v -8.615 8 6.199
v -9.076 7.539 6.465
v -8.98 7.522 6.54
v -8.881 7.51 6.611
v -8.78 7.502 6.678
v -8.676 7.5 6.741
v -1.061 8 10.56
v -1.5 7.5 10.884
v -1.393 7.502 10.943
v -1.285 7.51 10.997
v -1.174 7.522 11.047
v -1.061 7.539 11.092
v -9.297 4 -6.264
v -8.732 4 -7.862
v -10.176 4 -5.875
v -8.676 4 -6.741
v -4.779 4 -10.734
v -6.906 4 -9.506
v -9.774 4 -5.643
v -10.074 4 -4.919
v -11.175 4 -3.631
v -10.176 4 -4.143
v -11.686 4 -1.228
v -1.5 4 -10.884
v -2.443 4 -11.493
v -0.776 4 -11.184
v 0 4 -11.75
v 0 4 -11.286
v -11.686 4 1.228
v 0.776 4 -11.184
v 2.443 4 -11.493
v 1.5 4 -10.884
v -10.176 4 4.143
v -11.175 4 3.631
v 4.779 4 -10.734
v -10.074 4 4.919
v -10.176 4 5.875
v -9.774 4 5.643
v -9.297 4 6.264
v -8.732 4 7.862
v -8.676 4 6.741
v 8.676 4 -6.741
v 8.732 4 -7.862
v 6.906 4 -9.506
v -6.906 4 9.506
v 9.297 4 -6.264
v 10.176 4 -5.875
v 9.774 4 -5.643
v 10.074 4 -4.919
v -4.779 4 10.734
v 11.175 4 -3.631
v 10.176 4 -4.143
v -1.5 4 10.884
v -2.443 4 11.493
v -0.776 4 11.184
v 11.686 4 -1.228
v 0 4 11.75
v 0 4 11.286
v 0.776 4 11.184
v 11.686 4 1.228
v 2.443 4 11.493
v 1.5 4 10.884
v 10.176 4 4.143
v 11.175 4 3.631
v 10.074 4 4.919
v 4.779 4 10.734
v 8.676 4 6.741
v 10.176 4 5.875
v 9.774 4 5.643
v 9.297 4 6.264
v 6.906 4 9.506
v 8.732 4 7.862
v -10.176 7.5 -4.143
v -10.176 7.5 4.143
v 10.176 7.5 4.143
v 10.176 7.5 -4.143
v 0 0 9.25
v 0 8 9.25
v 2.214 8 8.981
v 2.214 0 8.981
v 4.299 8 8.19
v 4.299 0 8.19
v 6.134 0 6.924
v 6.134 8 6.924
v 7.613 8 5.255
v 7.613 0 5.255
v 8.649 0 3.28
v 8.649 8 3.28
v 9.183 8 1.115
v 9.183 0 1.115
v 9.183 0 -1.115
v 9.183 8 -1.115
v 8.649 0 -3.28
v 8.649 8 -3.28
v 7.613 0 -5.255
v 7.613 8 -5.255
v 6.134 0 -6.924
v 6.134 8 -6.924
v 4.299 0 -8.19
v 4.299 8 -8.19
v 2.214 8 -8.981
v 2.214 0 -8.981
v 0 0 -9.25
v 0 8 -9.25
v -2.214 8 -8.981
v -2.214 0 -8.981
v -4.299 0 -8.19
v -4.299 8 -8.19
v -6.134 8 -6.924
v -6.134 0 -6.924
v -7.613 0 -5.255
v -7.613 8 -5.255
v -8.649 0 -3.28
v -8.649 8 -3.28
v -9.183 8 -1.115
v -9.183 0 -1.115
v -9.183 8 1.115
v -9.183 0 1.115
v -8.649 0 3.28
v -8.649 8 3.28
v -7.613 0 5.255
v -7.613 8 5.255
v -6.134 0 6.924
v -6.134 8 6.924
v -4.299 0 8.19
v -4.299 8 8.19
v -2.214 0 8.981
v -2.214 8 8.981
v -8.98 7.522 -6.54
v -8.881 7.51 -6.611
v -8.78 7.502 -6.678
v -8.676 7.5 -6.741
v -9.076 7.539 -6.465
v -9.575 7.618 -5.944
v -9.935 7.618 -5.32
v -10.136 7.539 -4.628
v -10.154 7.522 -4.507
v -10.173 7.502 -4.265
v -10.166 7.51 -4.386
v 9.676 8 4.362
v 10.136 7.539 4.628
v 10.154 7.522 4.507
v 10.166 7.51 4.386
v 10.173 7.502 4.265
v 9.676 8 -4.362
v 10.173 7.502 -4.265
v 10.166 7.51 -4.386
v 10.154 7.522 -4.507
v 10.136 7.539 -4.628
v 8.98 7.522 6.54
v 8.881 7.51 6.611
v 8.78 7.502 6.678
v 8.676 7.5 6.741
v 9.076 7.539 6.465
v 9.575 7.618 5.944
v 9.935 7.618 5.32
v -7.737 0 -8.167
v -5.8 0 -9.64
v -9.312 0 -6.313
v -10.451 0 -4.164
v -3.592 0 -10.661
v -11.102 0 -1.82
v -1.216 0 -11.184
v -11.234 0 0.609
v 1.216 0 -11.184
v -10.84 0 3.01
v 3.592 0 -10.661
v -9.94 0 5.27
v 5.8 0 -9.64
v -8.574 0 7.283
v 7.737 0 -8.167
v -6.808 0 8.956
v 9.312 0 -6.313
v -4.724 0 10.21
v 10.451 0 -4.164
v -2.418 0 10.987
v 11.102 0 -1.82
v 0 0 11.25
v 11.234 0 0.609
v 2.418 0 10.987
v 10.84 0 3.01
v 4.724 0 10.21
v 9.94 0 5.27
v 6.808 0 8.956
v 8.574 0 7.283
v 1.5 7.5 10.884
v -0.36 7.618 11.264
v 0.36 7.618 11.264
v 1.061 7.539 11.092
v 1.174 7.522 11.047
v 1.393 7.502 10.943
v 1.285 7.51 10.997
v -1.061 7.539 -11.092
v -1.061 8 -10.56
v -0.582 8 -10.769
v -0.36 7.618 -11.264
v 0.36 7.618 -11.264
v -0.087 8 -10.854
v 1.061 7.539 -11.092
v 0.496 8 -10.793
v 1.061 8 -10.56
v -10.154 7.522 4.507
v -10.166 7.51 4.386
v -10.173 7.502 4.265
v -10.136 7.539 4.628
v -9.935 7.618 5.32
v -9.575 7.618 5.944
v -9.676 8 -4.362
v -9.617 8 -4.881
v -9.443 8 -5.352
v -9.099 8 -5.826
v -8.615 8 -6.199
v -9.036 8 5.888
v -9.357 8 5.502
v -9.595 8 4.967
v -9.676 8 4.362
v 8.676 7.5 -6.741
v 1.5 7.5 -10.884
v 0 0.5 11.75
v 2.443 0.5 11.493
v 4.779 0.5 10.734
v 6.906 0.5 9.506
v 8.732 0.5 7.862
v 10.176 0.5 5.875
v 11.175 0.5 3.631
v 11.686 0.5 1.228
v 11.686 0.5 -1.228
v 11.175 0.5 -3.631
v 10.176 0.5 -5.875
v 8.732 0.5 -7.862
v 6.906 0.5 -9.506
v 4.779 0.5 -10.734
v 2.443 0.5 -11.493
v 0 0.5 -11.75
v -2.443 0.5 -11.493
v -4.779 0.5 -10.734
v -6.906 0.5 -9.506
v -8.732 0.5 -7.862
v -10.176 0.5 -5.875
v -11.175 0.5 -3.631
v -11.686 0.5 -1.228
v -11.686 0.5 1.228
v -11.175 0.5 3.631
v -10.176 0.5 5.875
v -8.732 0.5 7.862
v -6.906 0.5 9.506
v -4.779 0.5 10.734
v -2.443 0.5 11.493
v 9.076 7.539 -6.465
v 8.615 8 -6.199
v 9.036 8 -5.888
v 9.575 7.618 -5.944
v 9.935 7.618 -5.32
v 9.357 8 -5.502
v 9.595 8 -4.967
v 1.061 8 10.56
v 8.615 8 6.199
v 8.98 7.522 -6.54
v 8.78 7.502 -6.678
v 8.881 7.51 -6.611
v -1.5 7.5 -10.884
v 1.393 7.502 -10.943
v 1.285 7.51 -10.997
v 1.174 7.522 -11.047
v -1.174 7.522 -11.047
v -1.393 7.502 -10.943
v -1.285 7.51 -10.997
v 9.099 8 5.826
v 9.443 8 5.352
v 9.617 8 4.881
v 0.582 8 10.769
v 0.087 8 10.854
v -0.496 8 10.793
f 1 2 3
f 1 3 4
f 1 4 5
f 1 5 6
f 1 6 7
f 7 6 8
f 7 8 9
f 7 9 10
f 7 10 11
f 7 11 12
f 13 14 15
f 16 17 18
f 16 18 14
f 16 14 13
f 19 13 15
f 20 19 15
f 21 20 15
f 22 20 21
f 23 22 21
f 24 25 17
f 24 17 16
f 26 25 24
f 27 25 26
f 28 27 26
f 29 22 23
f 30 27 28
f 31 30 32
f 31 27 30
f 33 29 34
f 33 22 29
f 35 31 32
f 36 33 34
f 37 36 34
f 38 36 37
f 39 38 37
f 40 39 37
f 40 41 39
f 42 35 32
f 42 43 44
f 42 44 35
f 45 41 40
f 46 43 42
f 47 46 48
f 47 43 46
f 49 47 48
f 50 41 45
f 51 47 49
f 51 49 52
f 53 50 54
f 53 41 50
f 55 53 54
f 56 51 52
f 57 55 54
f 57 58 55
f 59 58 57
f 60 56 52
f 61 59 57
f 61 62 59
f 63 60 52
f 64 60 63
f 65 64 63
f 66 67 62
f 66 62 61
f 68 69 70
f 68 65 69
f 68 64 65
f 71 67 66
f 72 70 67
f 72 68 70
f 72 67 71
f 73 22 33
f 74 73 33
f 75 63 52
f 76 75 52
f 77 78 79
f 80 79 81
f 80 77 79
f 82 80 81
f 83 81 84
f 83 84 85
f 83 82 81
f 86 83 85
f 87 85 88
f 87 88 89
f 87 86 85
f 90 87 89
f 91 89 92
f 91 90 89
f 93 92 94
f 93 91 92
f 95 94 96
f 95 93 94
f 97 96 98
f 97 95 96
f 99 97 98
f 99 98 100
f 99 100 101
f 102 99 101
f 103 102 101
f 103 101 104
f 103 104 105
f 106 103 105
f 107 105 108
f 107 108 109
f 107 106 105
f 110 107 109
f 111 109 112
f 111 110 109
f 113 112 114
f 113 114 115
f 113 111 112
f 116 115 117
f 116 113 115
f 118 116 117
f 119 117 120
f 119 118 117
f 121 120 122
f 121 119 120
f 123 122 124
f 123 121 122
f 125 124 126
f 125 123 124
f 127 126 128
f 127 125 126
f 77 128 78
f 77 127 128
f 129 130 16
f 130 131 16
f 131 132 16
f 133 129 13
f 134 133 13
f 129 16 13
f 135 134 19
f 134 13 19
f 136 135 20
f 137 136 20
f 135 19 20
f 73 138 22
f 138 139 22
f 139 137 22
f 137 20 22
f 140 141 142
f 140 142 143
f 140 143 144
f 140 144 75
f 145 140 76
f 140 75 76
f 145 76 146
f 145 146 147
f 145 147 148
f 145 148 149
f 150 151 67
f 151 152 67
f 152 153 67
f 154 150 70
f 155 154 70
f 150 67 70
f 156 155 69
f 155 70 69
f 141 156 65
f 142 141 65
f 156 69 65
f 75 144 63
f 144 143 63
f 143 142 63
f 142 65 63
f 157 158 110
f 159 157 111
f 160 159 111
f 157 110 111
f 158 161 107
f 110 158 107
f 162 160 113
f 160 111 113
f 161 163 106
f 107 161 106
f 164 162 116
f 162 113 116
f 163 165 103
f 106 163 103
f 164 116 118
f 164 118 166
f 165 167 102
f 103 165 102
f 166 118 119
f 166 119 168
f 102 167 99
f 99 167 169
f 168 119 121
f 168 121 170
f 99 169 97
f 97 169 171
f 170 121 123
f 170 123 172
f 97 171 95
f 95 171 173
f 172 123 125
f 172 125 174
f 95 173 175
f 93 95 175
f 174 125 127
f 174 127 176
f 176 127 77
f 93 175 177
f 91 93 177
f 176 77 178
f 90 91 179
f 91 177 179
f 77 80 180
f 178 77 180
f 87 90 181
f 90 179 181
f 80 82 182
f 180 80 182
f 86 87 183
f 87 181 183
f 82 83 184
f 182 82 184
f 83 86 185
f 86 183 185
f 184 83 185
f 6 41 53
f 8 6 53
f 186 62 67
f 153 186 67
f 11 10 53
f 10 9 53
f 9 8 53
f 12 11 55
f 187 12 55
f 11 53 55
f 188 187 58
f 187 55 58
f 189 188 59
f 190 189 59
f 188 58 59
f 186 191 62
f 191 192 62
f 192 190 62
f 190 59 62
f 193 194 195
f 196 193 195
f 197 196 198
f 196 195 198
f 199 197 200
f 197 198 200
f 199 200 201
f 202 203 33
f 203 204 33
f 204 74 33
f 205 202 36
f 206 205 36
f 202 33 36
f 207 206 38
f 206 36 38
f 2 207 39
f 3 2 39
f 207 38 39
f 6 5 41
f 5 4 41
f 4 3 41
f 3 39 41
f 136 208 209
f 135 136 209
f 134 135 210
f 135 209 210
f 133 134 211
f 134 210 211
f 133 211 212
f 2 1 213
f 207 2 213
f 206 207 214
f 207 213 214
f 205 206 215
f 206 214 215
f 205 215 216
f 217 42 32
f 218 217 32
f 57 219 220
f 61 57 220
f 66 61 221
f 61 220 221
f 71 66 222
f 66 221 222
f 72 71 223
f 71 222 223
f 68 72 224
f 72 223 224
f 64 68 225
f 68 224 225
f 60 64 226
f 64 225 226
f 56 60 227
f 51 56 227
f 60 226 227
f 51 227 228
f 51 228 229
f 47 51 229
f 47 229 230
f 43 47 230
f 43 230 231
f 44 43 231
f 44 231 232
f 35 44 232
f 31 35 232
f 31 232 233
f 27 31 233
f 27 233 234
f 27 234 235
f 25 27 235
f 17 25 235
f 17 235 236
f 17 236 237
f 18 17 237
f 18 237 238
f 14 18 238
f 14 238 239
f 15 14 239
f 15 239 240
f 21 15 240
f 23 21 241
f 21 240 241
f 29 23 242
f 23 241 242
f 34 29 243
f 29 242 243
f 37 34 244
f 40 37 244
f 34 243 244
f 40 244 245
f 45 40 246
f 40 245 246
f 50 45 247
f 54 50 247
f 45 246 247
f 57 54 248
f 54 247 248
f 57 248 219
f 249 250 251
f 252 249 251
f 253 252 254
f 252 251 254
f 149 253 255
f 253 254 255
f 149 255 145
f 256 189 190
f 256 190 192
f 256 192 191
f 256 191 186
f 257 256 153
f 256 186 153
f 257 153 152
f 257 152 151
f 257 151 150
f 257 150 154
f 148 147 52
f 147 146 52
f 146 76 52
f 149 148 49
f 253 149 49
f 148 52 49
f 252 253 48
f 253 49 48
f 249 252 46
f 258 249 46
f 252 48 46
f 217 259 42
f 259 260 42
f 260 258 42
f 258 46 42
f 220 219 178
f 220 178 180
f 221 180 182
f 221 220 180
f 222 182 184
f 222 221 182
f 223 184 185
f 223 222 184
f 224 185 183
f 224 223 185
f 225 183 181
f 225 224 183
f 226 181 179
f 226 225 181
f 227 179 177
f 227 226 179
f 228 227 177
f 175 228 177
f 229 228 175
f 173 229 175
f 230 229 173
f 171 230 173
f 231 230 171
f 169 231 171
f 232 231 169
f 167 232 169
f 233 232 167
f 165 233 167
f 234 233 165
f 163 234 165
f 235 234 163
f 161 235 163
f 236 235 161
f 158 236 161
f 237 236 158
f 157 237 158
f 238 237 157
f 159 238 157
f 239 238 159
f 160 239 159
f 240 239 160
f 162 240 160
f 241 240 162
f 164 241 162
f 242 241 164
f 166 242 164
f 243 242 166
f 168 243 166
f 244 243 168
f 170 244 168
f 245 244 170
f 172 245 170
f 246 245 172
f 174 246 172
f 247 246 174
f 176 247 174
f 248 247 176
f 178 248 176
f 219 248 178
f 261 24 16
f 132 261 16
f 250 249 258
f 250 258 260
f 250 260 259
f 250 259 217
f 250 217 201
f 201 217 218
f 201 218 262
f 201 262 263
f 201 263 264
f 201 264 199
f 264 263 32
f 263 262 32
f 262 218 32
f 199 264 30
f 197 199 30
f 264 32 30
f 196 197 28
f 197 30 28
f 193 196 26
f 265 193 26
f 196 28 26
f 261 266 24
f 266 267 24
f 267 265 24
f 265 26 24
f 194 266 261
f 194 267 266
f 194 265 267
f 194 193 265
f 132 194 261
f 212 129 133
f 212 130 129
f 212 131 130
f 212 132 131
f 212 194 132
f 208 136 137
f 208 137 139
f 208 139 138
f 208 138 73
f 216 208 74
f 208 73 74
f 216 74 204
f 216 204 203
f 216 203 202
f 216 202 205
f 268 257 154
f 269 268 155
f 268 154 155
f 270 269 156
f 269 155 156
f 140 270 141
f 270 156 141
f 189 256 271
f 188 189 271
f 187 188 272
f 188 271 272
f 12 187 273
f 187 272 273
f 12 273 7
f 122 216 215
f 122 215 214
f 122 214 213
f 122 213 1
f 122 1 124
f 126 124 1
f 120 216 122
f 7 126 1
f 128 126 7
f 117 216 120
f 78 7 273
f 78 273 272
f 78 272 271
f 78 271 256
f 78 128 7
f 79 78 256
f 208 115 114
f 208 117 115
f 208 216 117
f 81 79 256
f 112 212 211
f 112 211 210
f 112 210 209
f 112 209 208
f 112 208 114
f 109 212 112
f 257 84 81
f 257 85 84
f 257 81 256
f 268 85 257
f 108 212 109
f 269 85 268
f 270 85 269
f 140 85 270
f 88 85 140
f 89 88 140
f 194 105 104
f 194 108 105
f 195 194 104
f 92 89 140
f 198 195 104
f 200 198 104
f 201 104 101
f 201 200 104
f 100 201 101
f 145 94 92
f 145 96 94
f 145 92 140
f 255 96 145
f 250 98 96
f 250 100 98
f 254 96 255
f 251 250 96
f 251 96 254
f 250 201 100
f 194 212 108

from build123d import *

# Parameters (mm, degrees)
SKETCH_1_R      = 11.75
SKETCH_1_R_2    = 9.25
EXTRUDE_1_DEPTH = 4
SKETCH_2_R      = 9.25
EXTRUDE_2_DEPTH = 4
CHAMFER_1_SIZE  = 0.5
FILLET_1_R      = 3


with BuildPart() as part:
    # 草图1 → 凸台-拉伸1 (new body)
    with BuildSketch(Plane(origin=(0, 0, 0), x_dir=(1, 0, 0), z_dir=(0, 1, 0))):
        with Locations(Location((0, 0, 0), (0, 0, 270))):
            Circle(SKETCH_1_R)
        with Locations(Location((0, 0, 0), (0, 0, 270))):
            Circle(SKETCH_1_R_2, mode=Mode.SUBTRACT)
    extrude(amount=EXTRUDE_1_DEPTH)

    # 草图2 → 凸台-拉伸2 (add)
    with BuildSketch(Plane(origin=(0, 4, 0), x_dir=(1, 0, 0), z_dir=(0, 1, 0))):
        Polygon((0, 11.75), (-10.175798494, 5.875), (-10.175798494, -5.875), (0, -11.75), (10.175798494, -5.875), (10.175798494, 5.875), align=None)
        with Locations(Location((0, 0, 0), (0, 0, 270))):
            Circle(SKETCH_2_R, mode=Mode.SUBTRACT)
    extrude(amount=EXTRUDE_2_DEPTH)

    # 倒角1
    chamfer_1_edges = [part.edges().sort_by_distance(p)[0] for p in [
        (5.087899247, 8, -8.8125),
        (-5.087899247, 8, -8.8125),
        (-10.175798494, 8, 0),
        (-5.087899247, 8, 8.8125),
        (5.087899247, 8, 8.8125),
        (10.175798494, 8, 0),
        (0, 0, -11.75),
    ]]
    chamfer(chamfer_1_edges, length=CHAMFER_1_SIZE)

    # 圆角1
    # the kernel refuses this fillet: 3 mm, written as the material it takes off along each edge
    with BuildSketch(Plane(origin=(-10.175798494, 4, 5.875), x_dir=(0.8660254037844421, 0, 0.49999999999999395), z_dir=(0, 1, 0)), Plane(origin=(-10.175798494, 4, -5.875), x_dir=(0, 0, 1), z_dir=(0, 1, 0)), Plane(origin=(0, 4, -11.75), x_dir=(-0.866025403784437, 0, 0.5000000000000027), z_dir=(0, 1, 0))) as fillet_1_piece_1:
        with BuildLine():
            CenterArc((FILLET_1_R * 0.57735026919, FILLET_1_R), FILLET_1_R, 210, 60)
            Line((-FILLET_1_R * 0.288675134595, FILLET_1_R * 0.5), (0, 0))
            Line((0, 0), (FILLET_1_R * 0.57735026919, 0))
        make_face()
    extrude(amount=7.830127019, mode=Mode.SUBTRACT)
    with BuildSketch(Plane(origin=(10.175798494, 4, -5.875), x_dir=(0, 0, 1), z_dir=(0, 1, 0)), Plane(origin=(10.175798494, 4, 5.875), x_dir=(-0.8660254037844379, 0, 0.5000000000000011), z_dir=(0, 1, 0)), Plane(origin=(0, 4, 11.75), x_dir=(-0.8660254037844418, 0, -0.4999999999999945), z_dir=(0, 1, 0))) as fillet_1_piece_2:
        with BuildLine():
            CenterArc((FILLET_1_R * 0.57735026919, -FILLET_1_R), FILLET_1_R, 90, 60)
            Line((-FILLET_1_R * 0.288675134595, -FILLET_1_R * 0.5), (0, 0))
            Line((0, 0), (FILLET_1_R * 0.57735026919, 0))
        make_face()
    extrude(amount=7.830127019, mode=Mode.SUBTRACT)
    with BuildSketch(Plane(origin=(7.820029772, 9.855768722, -4.514896294), x_dir=(0.2672612419124255, -0.2672612419124255, 0.9258200997725509), z_dir=(0.6546536707079768, -0.6546536707079768, -0.3779644730092288)), Plane(origin=(0, 9.855768722, 9.029792588), x_dir=(-0.935414346693487, -0.26726124191242306, -0.2314550249431329), z_dir=(3.5248488275713354e-15, -0.6546536707079781, 0.7559289460184537))) as fillet_1_piece_3:
        with BuildLine():
            CenterArc((FILLET_1_R * 0.377964473009, FILLET_1_R), FILLET_1_R, 228.590377891, 41.409622109)
            Line((-FILLET_1_R * 0.283473354757, FILLET_1_R * 0.25), (0, 0))
            Line((0, 0), (FILLET_1_R * 0.377964473009, 0))
        make_face()
    extrude(amount=6.433229711, mode=Mode.SUBTRACT)
    with BuildSketch(Plane(origin=(12.031567217, 5.644231278, 6.946428571), x_dir=(-0.66815310478106, -0.2672612419124238, 0.6943650748294146), z_dir=(-0.6546536707079774, 0.6546536707079774, -0.37796447300922653)), Plane(origin=(0, 9.855768722, -9.029792588), x_dir=(-0.935414346693485, -0.26726124191242234, 0.2314550249431414), z_dir=(-3.944473687996493e-15, -0.6546536707079779, -0.755928946018454)), Plane(origin=(-7.820029772, 9.855768722, -4.514896294), x_dir=(-0.26726124191242423, -0.26726124191242345, 0.9258200997725519), z_dir=(-0.6546536707079775, -0.6546536707079774, -0.37796447300922653)), Plane(origin=(-7.820029772, 9.855768722, 4.514896294), x_dir=(0.6681531047810633, -0.26726124191242634, 0.6943650748294108), z_dir=(-0.6546536707079768, -0.6546536707079768, 0.37796447300922886))) as fillet_1_piece_4:
        with BuildLine():
            CenterArc((FILLET_1_R * 0.377964473009, -FILLET_1_R), FILLET_1_R, 90, 41.409622109)
            Line((-FILLET_1_R * 0.283473354757, -FILLET_1_R * 0.25), (0, 0))
            Line((0, 0), (FILLET_1_R * 0.377964473009, 0))
        make_face()
    extrude(amount=6.433229711, mode=Mode.SUBTRACT)


solid = part.part
